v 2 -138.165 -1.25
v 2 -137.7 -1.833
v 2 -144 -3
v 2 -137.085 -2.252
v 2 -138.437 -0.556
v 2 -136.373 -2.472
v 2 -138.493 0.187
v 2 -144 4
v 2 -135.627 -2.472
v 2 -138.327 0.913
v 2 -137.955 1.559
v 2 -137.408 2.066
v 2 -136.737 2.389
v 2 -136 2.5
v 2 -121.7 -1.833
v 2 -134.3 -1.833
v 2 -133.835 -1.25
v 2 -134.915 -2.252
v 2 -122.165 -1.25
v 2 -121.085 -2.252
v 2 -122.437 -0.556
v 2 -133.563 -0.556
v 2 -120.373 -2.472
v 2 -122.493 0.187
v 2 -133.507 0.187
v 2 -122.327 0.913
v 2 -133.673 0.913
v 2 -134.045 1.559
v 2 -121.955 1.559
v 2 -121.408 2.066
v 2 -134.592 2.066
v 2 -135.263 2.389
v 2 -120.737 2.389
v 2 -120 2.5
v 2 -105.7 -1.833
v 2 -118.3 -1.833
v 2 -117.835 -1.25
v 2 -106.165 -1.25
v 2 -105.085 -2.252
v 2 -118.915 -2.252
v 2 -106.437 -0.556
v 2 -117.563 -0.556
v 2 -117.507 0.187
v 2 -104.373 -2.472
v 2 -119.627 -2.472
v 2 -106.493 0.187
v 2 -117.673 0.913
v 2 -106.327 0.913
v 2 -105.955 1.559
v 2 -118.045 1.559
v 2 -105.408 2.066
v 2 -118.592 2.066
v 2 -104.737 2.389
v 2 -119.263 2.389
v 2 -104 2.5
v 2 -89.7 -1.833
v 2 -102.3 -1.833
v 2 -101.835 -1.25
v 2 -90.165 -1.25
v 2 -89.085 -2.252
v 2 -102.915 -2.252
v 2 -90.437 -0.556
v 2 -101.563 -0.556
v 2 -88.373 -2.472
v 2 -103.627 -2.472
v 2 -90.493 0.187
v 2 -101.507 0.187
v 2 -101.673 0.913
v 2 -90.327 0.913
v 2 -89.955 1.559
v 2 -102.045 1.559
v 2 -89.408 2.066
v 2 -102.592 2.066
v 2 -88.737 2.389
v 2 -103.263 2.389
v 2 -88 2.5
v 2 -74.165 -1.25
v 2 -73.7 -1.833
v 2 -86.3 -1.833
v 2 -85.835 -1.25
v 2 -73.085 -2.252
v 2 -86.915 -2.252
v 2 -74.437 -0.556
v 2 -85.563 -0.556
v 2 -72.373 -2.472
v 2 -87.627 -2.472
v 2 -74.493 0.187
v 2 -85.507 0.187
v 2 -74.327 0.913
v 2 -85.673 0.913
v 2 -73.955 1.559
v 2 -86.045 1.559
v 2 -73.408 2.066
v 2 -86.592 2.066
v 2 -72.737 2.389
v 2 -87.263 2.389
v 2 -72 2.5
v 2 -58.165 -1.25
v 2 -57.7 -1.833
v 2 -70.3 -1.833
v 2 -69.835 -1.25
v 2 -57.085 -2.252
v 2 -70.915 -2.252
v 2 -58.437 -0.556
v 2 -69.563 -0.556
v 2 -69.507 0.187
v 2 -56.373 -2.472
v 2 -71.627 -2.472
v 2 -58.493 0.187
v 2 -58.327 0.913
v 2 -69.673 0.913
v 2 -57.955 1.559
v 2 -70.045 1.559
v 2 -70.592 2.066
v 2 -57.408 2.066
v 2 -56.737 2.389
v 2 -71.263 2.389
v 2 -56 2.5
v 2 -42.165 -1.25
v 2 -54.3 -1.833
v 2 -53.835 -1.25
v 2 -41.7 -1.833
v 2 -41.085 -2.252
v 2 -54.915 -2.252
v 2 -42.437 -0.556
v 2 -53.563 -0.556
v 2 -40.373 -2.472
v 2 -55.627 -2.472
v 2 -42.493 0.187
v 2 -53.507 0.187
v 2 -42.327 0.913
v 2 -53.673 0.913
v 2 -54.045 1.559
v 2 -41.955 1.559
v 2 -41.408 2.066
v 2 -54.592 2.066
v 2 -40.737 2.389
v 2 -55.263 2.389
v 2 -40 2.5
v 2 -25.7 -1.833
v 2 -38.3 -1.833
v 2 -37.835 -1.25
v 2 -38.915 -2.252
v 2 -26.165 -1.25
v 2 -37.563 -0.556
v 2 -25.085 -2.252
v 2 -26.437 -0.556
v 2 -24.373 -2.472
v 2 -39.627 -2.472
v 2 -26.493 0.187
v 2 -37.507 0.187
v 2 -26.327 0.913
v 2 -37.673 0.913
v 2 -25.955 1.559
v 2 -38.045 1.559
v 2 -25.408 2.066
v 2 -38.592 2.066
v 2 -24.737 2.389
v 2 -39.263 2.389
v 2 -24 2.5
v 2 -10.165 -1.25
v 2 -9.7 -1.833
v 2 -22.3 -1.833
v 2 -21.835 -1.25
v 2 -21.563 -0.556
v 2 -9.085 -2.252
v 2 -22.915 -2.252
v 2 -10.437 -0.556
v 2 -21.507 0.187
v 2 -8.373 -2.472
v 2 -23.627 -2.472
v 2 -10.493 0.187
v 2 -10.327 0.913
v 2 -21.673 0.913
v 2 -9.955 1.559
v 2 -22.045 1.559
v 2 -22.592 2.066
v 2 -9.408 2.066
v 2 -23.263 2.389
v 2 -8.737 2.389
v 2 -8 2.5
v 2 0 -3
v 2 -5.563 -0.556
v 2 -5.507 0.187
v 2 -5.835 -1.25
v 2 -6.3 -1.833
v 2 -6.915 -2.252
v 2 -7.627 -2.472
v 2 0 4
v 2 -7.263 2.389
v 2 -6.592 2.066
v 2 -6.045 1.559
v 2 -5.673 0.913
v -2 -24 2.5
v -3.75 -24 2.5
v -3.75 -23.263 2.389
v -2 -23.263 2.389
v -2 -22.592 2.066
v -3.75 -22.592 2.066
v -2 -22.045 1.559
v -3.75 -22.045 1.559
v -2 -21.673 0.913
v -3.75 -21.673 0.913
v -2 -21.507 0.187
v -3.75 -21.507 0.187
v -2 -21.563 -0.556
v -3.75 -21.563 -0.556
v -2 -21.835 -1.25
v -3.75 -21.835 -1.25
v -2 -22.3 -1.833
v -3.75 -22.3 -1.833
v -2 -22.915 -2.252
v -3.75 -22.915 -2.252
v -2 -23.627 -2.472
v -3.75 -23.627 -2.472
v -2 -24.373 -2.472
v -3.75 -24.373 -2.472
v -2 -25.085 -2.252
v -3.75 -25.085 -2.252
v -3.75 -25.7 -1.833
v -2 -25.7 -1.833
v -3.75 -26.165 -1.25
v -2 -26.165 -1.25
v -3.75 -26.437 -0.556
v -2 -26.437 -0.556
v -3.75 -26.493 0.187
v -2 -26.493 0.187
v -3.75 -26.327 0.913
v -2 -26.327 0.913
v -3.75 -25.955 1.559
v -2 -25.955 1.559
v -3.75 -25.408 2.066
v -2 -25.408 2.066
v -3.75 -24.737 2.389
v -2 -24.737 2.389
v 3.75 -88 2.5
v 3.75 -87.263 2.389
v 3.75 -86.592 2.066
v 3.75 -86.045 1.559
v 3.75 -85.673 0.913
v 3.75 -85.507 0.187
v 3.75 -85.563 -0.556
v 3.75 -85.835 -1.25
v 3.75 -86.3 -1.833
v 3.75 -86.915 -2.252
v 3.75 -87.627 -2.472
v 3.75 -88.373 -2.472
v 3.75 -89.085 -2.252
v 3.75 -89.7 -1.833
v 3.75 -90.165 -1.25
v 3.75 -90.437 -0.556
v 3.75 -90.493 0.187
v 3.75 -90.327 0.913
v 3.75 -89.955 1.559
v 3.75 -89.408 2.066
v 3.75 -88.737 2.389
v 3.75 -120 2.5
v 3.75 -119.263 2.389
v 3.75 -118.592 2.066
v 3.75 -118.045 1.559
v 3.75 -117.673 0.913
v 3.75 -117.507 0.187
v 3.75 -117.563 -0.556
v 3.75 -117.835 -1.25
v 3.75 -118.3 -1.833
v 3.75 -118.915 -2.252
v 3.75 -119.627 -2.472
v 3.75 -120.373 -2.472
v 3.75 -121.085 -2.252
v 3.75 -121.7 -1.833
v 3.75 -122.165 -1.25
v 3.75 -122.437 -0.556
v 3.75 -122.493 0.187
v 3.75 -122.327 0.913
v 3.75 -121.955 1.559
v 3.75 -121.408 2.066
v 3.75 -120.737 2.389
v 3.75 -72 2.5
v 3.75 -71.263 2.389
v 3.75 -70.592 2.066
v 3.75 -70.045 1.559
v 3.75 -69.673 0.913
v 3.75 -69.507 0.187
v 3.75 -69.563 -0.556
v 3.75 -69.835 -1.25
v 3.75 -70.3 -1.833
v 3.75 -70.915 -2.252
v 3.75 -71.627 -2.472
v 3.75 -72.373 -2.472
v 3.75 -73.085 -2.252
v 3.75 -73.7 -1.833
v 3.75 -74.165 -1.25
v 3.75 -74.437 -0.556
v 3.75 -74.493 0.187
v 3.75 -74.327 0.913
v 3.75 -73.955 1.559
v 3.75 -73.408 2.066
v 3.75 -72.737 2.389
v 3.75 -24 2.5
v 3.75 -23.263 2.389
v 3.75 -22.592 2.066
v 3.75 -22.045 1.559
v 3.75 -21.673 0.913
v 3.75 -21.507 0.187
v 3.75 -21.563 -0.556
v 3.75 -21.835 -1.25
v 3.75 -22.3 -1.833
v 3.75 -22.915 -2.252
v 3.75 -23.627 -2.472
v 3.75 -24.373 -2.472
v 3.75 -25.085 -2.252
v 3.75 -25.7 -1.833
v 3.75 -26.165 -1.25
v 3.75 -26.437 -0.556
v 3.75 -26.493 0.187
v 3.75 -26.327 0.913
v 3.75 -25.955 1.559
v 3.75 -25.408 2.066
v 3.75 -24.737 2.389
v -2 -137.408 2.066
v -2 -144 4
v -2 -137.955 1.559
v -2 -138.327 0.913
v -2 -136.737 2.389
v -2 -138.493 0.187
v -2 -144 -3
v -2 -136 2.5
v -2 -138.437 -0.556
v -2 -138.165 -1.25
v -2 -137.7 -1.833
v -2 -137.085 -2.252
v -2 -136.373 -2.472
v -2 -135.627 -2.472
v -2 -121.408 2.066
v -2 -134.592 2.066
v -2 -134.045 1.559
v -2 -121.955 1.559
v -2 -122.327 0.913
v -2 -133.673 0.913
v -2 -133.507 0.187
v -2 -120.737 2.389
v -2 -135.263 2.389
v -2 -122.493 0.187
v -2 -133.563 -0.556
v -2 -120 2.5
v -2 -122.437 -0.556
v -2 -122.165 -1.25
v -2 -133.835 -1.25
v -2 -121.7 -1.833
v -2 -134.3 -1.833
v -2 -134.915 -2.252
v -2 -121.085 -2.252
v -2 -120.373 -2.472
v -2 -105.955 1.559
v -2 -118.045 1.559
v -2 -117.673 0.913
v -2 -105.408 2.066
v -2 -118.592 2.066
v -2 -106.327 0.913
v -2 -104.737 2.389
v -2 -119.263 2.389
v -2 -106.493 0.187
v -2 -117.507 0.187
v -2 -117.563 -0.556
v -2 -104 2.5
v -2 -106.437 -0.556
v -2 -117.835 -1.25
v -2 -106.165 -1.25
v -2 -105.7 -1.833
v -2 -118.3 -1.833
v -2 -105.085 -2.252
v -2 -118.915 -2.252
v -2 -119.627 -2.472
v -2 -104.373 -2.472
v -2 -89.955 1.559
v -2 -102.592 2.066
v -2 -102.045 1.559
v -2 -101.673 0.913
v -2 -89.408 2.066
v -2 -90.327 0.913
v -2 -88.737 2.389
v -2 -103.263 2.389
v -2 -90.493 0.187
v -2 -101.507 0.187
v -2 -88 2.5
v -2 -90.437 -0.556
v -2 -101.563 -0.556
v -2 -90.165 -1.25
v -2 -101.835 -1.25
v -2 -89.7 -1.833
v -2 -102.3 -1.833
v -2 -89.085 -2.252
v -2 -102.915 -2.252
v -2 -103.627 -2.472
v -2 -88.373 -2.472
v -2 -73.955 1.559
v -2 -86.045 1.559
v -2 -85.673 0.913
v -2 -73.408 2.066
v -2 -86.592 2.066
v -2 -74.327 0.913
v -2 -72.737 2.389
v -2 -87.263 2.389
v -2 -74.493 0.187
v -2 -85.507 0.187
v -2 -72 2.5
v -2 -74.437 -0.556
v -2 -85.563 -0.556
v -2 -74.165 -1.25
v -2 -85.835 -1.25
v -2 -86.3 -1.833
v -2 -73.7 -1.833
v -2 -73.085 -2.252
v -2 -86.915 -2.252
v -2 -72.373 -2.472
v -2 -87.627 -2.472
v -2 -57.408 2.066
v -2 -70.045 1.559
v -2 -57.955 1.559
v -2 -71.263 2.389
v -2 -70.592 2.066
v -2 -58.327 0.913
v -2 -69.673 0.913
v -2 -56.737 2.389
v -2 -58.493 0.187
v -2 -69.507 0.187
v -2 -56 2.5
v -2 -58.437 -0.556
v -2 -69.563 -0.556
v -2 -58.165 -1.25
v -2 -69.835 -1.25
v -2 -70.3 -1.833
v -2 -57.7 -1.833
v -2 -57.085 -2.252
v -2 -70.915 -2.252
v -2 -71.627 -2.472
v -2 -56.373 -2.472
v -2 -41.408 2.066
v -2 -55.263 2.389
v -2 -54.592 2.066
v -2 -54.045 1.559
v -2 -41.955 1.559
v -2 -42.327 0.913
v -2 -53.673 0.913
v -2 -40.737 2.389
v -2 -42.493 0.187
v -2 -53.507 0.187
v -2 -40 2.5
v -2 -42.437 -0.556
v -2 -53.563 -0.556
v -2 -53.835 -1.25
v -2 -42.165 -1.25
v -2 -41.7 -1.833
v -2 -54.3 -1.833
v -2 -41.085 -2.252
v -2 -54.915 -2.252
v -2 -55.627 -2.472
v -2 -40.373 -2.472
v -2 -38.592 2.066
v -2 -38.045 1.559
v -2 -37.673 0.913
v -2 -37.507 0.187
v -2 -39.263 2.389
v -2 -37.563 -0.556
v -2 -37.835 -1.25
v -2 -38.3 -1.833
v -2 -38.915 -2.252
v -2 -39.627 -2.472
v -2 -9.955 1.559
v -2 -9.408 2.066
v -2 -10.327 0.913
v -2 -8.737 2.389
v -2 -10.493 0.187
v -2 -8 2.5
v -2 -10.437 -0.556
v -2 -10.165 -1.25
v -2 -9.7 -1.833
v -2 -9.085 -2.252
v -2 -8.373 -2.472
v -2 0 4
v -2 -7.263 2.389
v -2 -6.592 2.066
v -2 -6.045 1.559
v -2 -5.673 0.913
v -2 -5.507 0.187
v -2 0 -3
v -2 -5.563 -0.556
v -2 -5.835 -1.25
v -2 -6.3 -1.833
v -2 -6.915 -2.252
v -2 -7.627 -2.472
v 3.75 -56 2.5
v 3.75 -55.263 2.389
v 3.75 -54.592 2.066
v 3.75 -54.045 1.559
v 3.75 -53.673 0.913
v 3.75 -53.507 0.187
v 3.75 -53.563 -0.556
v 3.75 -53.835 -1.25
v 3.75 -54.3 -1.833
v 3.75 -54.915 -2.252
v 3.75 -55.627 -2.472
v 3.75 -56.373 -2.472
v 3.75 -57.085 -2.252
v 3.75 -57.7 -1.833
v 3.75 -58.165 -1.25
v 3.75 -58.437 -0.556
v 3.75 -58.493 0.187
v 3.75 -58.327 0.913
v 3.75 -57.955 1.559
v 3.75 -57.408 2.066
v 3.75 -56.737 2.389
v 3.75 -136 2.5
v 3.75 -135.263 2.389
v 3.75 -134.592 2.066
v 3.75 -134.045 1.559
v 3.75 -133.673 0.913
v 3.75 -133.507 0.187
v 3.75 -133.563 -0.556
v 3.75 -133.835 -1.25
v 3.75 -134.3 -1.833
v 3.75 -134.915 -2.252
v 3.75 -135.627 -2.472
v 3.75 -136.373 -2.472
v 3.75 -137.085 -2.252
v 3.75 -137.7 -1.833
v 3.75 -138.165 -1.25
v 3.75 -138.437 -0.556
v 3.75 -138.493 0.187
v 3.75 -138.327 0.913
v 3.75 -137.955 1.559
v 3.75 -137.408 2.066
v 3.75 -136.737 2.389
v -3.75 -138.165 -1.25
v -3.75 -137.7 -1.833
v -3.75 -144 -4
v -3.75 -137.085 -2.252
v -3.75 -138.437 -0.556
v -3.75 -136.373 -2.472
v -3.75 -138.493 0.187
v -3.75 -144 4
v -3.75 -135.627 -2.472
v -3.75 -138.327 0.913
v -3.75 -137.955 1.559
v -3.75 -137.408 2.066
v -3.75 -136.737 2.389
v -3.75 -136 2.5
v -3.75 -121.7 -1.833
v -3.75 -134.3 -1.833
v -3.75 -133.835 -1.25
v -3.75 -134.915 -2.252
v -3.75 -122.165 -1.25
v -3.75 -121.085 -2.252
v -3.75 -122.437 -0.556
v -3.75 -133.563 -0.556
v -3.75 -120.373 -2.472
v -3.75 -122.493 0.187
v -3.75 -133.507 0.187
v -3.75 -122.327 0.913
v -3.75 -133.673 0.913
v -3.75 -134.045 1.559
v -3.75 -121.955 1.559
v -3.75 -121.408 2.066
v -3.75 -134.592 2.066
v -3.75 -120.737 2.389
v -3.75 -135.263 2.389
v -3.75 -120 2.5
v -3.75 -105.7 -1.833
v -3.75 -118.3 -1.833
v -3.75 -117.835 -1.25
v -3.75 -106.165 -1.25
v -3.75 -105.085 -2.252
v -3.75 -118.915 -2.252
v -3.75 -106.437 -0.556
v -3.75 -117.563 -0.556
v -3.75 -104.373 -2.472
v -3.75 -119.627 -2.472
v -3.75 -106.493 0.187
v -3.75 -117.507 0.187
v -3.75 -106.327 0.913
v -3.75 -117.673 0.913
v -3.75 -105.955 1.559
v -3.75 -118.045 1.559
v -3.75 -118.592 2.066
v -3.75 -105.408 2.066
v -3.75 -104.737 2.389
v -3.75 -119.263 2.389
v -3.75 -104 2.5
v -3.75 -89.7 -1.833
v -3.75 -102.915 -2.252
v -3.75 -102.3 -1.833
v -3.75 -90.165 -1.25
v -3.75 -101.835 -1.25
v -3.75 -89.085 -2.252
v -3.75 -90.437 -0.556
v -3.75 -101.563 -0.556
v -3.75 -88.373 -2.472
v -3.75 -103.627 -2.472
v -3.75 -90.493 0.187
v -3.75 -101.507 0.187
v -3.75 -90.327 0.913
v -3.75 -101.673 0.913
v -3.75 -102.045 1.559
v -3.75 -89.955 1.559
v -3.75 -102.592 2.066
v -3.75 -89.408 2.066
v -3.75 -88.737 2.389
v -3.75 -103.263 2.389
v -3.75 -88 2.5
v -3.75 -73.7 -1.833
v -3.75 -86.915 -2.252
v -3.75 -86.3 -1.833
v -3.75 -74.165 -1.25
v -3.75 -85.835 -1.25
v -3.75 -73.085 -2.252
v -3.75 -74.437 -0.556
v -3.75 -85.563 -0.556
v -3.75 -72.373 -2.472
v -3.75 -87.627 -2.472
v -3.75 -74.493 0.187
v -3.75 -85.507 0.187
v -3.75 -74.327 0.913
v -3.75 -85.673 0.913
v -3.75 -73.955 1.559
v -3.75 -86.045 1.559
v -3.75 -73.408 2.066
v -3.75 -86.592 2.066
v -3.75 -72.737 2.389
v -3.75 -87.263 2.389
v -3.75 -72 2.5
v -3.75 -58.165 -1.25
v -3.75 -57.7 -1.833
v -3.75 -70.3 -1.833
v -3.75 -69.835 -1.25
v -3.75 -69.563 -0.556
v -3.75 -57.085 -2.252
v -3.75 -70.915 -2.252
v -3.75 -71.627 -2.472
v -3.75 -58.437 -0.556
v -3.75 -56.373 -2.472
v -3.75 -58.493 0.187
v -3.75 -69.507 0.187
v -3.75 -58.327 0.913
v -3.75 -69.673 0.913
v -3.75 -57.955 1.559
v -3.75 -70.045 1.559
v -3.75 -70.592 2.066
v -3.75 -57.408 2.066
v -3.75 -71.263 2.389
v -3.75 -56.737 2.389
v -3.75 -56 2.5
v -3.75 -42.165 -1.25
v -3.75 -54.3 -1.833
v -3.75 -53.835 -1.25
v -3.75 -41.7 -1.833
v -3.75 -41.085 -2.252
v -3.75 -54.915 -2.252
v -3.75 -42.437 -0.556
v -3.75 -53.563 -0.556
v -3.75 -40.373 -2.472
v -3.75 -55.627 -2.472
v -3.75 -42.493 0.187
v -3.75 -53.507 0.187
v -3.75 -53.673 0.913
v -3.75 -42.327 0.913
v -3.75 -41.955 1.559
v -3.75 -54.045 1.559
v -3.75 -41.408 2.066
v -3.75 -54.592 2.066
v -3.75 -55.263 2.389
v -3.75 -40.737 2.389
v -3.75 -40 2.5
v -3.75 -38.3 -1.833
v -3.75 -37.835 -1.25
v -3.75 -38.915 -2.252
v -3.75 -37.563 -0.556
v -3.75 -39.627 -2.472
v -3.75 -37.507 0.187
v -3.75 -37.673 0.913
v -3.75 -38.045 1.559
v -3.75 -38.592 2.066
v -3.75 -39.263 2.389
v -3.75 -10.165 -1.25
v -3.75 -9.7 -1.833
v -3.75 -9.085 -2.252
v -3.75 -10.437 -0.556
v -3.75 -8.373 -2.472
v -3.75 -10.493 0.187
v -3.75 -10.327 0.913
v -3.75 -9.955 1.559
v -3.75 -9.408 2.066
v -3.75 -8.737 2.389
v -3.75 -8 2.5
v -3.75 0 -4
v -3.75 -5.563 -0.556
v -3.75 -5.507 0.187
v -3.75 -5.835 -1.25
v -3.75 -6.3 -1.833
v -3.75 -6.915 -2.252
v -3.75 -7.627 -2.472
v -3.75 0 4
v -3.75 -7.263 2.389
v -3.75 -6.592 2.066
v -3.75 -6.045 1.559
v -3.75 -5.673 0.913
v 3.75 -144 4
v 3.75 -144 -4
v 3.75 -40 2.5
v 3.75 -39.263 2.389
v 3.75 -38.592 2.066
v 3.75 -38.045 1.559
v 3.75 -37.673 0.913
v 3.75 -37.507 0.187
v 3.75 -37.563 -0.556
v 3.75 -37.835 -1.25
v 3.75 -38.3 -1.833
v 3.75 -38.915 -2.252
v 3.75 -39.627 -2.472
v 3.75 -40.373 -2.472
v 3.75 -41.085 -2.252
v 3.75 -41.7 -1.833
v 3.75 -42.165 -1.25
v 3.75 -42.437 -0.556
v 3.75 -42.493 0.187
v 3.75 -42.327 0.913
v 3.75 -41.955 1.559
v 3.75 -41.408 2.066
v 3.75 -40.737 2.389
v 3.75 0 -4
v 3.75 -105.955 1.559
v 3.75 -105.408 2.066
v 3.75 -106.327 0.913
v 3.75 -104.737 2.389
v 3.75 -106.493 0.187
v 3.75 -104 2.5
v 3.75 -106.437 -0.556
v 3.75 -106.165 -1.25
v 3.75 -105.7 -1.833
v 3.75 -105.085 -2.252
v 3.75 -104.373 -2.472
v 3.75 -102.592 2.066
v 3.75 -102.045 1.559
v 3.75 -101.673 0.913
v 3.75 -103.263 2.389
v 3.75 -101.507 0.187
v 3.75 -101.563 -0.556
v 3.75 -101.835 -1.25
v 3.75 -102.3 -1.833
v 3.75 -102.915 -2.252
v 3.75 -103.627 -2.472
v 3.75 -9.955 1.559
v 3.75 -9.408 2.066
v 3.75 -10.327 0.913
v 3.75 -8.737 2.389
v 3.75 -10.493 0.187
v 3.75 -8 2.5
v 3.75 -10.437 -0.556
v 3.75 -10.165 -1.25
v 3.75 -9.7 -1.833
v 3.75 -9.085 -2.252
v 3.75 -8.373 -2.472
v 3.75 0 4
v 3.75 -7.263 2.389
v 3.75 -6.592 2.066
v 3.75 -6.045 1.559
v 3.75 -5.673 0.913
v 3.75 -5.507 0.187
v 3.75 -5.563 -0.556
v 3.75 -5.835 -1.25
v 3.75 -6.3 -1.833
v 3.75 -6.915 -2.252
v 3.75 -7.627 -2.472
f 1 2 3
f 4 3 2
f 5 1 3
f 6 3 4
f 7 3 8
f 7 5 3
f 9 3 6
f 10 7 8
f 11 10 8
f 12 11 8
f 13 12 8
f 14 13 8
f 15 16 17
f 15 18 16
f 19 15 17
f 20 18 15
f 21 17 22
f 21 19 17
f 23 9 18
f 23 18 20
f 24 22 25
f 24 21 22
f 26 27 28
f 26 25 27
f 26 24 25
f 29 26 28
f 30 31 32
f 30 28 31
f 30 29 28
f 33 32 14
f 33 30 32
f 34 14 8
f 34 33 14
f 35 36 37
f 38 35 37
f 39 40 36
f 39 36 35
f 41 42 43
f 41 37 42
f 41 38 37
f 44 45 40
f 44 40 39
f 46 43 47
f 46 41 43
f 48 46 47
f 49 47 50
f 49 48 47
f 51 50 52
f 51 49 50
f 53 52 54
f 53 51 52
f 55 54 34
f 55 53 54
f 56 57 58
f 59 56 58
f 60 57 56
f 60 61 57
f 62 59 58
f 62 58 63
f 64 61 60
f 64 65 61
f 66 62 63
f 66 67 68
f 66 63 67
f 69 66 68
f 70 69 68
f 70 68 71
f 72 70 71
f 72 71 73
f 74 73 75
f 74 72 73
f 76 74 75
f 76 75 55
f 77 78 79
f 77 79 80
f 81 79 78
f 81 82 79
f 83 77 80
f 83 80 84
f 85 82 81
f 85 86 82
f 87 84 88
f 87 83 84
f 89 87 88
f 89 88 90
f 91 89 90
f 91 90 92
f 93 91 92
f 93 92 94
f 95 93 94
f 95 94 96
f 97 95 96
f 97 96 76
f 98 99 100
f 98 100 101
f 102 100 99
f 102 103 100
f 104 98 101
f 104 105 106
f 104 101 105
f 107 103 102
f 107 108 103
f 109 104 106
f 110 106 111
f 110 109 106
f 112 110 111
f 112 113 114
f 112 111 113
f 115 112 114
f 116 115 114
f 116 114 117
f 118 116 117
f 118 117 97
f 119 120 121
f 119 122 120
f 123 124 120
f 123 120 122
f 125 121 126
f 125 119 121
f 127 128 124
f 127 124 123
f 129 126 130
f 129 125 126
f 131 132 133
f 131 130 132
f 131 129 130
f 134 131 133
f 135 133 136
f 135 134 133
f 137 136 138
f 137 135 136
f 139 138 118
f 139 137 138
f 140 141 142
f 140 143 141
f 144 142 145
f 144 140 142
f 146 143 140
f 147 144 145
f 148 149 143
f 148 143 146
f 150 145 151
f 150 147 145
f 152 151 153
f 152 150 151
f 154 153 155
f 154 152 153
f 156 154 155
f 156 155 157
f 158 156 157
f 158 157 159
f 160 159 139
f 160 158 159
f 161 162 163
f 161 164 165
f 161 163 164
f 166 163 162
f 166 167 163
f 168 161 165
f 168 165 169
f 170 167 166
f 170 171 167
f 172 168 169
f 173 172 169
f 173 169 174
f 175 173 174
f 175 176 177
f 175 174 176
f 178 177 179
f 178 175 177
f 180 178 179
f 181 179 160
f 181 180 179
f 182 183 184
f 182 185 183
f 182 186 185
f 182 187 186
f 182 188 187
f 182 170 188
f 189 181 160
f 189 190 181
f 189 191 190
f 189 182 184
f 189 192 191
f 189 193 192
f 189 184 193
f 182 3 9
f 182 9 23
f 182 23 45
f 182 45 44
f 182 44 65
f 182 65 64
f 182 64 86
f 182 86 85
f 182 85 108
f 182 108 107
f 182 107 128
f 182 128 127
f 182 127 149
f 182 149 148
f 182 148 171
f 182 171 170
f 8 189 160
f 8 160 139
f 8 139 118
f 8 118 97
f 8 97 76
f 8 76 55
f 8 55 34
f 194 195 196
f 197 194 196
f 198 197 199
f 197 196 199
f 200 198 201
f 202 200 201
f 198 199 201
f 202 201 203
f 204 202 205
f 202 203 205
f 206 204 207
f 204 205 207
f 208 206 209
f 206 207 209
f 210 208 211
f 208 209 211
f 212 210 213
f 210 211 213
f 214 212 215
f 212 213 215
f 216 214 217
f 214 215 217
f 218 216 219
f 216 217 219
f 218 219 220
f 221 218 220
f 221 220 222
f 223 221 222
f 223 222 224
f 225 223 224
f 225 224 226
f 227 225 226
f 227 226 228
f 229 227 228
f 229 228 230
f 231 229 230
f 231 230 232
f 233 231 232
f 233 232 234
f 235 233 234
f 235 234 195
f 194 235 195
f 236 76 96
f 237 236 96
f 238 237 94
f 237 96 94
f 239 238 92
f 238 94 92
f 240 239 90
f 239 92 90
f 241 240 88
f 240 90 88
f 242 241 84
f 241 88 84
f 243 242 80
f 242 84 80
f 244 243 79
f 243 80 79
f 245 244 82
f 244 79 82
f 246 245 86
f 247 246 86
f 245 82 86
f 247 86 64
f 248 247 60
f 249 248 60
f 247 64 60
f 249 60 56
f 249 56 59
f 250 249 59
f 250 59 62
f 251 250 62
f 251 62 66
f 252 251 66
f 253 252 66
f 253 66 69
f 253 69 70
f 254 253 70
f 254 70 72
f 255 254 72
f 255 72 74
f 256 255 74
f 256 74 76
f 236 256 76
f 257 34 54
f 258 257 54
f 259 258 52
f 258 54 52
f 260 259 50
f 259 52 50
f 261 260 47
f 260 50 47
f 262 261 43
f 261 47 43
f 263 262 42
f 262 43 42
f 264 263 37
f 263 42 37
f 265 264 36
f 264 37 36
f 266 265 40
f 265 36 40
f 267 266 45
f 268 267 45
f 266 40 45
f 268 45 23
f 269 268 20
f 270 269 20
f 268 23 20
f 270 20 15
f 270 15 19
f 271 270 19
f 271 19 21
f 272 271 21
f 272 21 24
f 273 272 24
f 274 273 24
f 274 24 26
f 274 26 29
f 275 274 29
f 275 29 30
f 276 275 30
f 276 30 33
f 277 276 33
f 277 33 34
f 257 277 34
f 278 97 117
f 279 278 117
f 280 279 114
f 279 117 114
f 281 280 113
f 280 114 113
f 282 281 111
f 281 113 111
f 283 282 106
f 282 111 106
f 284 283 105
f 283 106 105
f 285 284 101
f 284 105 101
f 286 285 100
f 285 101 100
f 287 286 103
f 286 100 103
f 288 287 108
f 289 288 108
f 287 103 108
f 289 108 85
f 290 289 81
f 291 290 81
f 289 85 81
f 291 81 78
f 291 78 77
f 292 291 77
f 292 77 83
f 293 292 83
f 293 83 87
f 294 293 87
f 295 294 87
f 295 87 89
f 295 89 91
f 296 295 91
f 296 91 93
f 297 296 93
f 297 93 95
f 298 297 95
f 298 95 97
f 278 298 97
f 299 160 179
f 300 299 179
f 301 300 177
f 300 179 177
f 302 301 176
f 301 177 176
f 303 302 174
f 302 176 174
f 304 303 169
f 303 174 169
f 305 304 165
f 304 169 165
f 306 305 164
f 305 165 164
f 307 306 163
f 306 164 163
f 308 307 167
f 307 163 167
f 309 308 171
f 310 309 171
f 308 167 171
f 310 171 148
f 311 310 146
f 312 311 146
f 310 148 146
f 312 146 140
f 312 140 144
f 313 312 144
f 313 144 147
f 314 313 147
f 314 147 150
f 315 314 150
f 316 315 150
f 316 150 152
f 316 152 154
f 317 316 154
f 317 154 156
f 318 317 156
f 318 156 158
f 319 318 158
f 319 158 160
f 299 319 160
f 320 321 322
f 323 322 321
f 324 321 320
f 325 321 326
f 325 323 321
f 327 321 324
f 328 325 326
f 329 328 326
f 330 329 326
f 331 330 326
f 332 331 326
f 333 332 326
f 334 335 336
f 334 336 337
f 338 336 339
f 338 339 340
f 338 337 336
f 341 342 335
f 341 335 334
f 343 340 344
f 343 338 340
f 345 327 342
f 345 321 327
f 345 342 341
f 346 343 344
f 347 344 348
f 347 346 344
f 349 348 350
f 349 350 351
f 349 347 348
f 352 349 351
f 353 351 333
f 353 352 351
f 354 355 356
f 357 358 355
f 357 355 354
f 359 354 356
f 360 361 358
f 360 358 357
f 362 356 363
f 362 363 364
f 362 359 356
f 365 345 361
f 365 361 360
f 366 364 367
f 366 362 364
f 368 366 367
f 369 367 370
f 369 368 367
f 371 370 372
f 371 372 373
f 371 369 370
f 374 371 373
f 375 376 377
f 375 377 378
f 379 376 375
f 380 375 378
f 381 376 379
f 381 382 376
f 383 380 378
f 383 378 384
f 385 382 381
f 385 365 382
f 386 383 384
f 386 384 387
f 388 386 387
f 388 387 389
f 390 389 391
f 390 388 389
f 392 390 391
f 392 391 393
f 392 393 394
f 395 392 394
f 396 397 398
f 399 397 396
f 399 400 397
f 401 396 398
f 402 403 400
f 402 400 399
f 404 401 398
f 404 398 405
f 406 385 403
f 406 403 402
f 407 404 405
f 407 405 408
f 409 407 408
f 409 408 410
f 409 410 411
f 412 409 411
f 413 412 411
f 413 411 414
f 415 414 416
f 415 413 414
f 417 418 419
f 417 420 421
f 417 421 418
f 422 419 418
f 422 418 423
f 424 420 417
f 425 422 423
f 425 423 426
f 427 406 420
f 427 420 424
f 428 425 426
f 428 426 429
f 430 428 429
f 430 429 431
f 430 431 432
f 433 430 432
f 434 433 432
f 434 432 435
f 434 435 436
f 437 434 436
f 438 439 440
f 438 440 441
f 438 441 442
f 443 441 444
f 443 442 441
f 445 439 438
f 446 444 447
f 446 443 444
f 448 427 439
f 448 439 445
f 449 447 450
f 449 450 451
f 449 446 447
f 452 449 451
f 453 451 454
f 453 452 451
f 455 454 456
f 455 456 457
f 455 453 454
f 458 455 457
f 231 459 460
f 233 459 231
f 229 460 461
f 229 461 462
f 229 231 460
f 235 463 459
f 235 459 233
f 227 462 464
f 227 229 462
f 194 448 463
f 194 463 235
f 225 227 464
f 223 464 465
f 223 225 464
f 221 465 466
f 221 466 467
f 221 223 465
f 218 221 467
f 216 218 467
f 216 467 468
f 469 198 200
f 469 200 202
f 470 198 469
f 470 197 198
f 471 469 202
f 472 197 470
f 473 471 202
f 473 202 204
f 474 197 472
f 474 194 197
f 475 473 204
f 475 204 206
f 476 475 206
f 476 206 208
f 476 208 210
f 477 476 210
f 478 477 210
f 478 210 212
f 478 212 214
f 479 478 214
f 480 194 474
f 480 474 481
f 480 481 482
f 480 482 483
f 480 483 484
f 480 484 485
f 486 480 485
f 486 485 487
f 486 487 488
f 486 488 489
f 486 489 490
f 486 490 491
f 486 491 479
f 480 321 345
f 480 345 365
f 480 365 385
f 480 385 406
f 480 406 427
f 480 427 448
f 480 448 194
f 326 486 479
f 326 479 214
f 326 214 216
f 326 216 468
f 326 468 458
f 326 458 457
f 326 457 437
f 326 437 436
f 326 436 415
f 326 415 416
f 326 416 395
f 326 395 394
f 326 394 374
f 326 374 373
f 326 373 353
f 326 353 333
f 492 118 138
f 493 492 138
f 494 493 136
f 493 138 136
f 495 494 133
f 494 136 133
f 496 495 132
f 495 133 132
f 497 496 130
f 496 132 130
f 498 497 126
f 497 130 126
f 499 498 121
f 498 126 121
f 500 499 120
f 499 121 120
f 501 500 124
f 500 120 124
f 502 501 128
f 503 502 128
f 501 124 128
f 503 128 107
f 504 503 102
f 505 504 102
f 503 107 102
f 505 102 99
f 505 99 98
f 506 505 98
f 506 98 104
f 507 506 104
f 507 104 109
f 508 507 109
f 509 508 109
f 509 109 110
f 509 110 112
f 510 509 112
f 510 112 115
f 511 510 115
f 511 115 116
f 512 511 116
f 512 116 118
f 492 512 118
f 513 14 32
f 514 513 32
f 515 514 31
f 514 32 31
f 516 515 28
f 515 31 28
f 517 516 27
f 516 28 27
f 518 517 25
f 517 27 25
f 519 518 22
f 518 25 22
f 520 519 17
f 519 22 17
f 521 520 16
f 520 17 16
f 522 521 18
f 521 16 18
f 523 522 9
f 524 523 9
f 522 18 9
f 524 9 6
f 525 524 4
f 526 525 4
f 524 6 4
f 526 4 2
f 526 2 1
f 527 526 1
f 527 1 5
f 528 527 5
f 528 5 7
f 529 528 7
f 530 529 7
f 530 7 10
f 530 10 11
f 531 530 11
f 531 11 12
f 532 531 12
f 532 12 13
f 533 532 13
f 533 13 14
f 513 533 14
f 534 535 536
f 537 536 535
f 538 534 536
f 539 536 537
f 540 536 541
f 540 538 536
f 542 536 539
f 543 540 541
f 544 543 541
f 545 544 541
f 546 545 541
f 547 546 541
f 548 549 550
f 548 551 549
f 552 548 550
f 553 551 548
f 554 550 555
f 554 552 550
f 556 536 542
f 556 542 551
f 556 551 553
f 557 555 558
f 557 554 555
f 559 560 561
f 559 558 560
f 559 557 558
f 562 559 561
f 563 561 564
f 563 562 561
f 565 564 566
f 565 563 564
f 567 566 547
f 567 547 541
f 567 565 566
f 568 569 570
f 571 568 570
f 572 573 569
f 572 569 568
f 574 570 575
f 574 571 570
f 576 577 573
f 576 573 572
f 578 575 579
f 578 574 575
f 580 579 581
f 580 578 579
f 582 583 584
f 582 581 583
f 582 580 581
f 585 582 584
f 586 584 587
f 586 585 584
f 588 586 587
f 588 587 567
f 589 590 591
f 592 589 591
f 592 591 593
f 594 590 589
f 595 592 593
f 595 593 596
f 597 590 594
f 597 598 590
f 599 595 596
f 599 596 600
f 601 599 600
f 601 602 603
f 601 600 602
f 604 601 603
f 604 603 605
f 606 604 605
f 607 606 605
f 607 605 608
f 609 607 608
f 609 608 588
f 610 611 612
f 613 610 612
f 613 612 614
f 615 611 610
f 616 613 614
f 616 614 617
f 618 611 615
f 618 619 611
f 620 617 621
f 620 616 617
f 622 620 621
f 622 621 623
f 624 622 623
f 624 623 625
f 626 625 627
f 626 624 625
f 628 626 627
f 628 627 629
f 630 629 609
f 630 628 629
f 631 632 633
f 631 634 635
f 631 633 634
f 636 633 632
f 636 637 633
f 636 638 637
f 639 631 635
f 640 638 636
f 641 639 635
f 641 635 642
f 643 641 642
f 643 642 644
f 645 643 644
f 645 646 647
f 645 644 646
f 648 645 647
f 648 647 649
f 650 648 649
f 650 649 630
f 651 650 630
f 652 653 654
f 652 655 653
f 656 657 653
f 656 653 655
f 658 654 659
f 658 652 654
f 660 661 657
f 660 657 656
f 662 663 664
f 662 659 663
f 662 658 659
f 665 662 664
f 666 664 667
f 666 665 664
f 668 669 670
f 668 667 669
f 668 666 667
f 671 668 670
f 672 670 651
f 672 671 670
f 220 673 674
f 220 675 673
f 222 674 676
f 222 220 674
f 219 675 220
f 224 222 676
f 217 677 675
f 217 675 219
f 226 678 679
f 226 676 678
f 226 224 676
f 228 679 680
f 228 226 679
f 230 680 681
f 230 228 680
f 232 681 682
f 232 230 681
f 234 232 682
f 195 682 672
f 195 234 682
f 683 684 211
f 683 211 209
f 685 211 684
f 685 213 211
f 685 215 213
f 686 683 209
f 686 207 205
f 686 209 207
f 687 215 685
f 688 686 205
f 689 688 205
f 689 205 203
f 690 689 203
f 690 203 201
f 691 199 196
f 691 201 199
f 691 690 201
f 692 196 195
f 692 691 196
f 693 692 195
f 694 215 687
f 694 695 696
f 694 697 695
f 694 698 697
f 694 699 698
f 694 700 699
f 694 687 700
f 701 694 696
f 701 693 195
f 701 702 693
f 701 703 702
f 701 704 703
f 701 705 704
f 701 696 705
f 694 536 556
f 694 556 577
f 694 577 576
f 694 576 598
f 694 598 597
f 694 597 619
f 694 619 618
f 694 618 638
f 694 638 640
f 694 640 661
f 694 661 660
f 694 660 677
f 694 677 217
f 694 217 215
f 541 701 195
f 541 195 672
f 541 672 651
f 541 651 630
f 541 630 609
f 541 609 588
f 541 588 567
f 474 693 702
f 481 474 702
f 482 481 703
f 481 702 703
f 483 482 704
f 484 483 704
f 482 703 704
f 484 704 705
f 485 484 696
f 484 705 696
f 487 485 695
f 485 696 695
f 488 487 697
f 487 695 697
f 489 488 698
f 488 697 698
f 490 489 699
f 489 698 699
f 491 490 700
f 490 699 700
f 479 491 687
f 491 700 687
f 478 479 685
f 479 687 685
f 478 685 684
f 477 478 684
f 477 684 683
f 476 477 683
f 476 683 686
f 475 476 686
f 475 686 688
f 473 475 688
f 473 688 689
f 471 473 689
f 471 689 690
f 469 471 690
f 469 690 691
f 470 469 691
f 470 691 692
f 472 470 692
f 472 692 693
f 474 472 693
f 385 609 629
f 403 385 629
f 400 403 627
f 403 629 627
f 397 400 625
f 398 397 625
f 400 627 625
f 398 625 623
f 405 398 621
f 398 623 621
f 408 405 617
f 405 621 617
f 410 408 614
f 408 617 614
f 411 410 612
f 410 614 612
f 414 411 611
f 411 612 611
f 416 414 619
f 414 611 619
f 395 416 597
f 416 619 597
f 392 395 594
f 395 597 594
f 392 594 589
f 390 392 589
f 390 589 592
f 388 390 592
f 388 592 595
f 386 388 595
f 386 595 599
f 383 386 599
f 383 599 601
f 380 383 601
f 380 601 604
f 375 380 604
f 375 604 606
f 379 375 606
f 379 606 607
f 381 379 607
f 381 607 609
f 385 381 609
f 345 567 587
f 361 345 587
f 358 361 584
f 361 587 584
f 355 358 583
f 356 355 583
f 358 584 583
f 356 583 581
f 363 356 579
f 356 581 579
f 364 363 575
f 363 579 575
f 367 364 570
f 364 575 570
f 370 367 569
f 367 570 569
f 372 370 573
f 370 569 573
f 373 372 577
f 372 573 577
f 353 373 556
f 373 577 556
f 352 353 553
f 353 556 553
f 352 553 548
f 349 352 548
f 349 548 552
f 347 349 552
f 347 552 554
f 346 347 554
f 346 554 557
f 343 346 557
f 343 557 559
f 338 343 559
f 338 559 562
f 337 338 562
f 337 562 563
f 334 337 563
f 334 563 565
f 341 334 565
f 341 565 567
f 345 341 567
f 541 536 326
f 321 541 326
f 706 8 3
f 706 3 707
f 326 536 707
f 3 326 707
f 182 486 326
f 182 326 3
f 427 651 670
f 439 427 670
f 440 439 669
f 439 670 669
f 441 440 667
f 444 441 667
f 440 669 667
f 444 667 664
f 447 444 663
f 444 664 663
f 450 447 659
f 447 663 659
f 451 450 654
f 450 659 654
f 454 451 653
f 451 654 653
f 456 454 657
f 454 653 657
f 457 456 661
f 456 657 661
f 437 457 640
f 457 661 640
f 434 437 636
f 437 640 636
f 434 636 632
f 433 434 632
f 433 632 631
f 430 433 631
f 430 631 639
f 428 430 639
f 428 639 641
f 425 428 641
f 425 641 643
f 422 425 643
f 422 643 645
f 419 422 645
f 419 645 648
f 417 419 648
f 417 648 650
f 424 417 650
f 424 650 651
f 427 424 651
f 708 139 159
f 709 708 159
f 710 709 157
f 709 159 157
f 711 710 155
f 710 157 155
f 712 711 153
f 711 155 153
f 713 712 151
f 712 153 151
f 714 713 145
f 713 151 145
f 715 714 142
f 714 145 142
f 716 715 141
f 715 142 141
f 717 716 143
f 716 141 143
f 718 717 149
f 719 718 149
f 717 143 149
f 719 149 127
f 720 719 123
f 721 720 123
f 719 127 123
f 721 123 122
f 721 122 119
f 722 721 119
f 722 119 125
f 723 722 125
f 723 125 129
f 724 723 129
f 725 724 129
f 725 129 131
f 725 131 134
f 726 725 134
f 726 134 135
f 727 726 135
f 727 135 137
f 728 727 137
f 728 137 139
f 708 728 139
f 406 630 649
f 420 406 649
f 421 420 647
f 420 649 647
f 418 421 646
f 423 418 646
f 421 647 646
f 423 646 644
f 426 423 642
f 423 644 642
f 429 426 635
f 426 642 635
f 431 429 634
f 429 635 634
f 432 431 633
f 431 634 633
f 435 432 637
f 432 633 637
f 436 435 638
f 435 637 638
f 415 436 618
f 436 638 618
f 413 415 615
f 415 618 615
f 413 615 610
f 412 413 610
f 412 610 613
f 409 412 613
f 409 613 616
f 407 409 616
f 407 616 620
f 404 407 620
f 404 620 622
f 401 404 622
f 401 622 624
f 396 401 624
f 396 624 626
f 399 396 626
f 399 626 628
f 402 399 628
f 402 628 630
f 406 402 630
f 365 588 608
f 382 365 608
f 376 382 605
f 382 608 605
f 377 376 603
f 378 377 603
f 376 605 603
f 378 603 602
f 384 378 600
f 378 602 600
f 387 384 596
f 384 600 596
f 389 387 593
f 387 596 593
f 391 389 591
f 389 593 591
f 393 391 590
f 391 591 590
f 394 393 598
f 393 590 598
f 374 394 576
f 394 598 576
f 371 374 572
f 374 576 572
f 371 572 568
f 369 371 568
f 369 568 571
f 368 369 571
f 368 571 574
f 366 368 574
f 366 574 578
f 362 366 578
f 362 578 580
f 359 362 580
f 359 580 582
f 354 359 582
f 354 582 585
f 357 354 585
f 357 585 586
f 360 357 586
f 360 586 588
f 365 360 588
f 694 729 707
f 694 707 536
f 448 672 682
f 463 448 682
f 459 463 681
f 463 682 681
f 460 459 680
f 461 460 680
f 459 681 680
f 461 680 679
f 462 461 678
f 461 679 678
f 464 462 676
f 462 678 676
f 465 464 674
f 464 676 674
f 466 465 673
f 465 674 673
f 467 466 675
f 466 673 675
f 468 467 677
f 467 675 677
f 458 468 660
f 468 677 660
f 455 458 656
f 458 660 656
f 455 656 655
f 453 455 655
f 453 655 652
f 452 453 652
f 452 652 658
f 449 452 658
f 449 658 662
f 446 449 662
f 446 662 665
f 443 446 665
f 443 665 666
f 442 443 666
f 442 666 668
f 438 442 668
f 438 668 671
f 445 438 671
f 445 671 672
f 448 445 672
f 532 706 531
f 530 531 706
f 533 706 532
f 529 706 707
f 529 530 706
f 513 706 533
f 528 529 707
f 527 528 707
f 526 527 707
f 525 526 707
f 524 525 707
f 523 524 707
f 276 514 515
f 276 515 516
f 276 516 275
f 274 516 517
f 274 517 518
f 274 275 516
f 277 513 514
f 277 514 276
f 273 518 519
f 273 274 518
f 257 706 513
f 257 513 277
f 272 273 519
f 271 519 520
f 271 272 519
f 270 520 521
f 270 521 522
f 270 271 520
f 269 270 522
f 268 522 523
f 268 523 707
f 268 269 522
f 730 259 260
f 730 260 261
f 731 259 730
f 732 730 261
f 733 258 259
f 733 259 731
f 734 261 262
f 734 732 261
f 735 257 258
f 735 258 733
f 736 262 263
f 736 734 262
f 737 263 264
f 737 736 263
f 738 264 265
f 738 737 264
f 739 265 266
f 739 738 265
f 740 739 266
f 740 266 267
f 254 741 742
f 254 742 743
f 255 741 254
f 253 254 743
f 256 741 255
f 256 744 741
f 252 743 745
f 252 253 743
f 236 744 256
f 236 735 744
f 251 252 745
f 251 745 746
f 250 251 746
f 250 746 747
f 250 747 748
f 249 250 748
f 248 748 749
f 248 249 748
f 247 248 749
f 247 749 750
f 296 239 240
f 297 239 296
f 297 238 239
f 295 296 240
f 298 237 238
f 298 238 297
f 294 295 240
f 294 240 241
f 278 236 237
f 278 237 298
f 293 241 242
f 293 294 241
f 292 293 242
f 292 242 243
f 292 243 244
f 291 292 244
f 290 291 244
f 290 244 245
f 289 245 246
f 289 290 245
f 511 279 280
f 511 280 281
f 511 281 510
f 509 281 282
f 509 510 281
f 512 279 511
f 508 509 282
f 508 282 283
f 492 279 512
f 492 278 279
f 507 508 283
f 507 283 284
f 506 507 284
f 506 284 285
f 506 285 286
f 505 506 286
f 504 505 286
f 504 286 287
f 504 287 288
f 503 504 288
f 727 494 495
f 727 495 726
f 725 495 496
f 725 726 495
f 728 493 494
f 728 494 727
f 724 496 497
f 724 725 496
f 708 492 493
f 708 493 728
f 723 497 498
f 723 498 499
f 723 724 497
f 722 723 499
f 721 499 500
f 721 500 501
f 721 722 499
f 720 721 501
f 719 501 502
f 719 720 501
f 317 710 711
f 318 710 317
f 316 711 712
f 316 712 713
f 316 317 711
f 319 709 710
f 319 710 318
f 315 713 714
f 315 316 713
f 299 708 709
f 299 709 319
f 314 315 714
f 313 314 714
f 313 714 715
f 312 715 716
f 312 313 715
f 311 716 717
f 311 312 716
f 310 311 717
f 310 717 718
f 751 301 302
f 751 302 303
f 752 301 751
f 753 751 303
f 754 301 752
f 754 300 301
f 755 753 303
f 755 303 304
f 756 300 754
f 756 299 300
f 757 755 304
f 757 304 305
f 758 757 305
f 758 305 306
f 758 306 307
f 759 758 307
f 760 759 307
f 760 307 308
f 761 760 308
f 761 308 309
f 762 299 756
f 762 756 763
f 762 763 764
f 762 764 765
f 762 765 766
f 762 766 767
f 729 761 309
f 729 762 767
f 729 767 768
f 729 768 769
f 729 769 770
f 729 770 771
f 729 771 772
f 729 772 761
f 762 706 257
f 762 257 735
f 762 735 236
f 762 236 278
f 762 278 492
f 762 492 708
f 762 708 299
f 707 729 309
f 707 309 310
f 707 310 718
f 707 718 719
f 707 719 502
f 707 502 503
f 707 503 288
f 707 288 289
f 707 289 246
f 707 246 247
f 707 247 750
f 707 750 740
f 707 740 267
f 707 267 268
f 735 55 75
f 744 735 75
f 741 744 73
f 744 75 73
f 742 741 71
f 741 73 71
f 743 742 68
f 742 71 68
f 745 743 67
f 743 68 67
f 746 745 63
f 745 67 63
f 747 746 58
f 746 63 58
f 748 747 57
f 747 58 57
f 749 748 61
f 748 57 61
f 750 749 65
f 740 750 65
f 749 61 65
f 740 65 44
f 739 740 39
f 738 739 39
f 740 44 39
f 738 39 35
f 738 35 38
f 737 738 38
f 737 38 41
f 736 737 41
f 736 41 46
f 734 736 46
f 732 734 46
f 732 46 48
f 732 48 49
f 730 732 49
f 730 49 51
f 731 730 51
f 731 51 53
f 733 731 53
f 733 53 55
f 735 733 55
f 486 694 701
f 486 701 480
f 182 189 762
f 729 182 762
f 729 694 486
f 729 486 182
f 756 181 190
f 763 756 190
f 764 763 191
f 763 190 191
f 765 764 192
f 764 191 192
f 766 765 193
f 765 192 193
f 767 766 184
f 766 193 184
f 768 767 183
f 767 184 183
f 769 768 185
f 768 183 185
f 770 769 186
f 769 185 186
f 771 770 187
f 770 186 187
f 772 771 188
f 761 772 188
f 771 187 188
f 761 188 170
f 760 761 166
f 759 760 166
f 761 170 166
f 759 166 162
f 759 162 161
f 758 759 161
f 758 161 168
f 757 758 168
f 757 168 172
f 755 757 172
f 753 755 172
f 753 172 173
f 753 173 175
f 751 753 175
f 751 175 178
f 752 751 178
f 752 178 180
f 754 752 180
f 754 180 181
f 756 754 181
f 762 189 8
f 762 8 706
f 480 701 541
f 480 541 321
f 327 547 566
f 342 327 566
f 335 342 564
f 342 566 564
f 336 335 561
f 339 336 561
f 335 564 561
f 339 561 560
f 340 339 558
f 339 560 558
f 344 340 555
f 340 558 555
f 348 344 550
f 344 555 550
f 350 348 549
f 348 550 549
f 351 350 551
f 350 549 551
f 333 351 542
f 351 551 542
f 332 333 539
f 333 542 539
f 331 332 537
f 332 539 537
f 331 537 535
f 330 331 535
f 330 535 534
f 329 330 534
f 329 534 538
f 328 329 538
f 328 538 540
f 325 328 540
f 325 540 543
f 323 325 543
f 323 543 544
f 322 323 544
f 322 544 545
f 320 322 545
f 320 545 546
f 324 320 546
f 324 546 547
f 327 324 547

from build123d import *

# Parameters (mm, degrees)
BASE_DEPTH  = 144
ESQUISSE2_R = 2.5
TROU_DEPTH  = 145.250649912


with BuildPart() as part:
    # Esquisse1 → Base (new body)
    with BuildSketch(Plane(origin=(0, 0, 0), x_dir=(1, 0, 0), z_dir=(0, 1, 0))):
        Polygon((-2, -4), (-2, 3), (2, 3), (2, -4), (3.75, -4), (3.75, 4), (-3.75, 4), (-3.75, -4), align=None)
    extrude(amount=-BASE_DEPTH)

    # Esquisse2 → Trou (cut, through all)
    with BuildSketch(Plane.ZY.offset(3.75)):
        with Locations((0, -8)):
            Circle(ESQUISSE2_R)
        with Locations((0, -24)):
            Circle(ESQUISSE2_R)
        with Locations((0, -40)):
            Circle(ESQUISSE2_R)
        with Locations((0, -56)):
            Circle(ESQUISSE2_R)
        with Locations((0, -72)):
            Circle(ESQUISSE2_R)
        with Locations((0, -88)):
            Circle(ESQUISSE2_R)
        with Locations((0, -104)):
            Circle(ESQUISSE2_R)
        with Locations((0, -120)):
            Circle(ESQUISSE2_R)
        with Locations((0, -136)):
            Circle(ESQUISSE2_R)
    extrude(amount=-TROU_DEPTH, mode=Mode.SUBTRACT)


solid = part.part
